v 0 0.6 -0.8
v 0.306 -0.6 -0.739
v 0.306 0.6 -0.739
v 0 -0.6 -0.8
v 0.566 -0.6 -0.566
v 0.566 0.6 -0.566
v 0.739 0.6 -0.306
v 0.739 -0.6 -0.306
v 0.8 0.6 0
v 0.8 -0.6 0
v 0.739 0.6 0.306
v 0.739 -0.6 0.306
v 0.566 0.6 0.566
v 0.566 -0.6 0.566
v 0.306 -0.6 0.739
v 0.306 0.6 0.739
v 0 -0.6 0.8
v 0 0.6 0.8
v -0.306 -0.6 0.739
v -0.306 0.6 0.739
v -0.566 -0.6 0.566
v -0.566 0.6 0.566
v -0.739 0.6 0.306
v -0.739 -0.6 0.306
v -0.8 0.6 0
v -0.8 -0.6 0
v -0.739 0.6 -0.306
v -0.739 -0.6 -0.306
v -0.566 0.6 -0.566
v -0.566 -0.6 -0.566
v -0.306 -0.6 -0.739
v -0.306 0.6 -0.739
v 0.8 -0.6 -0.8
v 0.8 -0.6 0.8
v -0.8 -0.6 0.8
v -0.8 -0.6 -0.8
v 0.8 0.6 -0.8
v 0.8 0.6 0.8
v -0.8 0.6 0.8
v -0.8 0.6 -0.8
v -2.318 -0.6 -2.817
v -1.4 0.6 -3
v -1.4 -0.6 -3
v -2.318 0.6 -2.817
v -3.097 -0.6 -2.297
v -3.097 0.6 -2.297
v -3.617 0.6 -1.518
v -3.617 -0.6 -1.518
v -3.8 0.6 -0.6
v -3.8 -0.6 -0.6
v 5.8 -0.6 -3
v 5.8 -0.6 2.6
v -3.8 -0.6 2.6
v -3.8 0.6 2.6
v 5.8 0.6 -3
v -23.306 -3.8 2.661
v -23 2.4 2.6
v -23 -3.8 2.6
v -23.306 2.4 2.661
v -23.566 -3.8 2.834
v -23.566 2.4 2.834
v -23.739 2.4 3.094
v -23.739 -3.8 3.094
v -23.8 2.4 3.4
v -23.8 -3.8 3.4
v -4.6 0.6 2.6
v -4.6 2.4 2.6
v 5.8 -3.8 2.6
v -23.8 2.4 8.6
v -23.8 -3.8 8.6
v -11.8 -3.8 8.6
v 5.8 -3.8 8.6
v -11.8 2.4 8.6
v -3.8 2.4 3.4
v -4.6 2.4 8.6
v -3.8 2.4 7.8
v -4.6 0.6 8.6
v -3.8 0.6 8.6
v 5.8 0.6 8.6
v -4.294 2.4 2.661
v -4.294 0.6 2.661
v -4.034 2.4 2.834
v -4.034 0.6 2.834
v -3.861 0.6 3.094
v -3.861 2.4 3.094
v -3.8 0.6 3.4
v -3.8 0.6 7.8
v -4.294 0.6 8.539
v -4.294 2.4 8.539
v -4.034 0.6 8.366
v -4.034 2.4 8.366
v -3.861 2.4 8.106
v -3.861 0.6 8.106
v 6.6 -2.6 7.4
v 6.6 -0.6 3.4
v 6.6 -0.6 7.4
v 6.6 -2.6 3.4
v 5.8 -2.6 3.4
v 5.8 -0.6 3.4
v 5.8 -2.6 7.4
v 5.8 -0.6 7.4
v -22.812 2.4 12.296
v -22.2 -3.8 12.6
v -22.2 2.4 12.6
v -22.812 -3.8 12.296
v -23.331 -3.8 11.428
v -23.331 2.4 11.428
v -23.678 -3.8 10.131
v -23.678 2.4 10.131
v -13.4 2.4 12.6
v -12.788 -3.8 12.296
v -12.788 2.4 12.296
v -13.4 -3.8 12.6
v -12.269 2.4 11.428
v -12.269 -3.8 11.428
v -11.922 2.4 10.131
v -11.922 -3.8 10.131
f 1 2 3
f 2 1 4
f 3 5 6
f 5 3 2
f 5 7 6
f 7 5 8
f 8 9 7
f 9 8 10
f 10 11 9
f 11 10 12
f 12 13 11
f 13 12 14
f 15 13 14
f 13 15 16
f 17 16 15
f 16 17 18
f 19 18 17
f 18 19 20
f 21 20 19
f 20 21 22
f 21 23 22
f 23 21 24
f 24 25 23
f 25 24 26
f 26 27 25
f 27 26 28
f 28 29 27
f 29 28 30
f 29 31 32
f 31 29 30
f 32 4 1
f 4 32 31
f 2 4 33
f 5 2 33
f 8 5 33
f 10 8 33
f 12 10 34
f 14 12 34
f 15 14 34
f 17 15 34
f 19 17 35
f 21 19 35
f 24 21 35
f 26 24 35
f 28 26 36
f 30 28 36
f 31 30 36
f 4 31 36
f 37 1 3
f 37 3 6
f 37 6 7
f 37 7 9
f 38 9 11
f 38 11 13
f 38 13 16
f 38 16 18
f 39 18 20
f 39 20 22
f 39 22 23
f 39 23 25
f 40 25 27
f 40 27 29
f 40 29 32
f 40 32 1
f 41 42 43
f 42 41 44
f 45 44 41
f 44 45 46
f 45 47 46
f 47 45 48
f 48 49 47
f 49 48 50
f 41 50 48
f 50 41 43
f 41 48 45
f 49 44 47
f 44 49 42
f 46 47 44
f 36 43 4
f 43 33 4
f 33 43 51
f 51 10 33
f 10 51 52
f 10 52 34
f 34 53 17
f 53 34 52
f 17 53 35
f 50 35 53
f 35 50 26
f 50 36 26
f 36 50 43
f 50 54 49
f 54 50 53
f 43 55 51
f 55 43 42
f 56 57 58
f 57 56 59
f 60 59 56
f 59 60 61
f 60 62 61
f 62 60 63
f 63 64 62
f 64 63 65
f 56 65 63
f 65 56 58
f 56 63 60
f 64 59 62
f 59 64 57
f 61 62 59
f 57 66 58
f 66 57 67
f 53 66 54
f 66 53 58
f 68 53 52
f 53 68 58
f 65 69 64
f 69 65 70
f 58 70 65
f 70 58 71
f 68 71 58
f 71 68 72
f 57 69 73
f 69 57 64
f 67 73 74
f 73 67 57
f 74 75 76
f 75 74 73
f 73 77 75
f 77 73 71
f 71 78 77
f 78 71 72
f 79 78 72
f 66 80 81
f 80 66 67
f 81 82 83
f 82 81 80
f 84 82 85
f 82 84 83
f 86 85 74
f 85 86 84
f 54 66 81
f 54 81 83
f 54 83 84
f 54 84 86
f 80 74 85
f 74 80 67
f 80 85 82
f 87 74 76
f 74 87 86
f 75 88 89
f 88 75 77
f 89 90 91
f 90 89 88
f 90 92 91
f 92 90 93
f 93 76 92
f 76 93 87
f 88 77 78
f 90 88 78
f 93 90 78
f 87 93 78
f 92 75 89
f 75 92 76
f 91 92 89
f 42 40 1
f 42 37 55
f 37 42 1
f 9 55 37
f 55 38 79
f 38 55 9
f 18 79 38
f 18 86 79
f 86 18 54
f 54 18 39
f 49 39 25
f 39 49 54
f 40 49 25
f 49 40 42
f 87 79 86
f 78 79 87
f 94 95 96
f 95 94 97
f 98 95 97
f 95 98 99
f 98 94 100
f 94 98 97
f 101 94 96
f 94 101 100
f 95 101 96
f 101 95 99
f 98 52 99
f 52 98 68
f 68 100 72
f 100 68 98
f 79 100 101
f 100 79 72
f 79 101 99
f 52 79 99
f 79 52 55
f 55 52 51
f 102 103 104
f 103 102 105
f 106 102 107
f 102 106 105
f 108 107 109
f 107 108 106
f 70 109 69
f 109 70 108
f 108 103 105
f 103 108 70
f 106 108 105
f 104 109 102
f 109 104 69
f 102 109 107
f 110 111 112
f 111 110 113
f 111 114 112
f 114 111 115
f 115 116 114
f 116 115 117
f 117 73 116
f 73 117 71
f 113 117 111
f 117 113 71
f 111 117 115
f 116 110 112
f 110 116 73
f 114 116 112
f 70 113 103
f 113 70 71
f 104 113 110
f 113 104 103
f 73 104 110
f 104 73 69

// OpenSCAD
// file: ../p/4-4edge.scad
use <../lib.scad>
function ldraw_lib__4_4edge() = [
// 0 Circle 1.0
// 0 Name: 4-4edge.dat
// 0 Author: James Jessiman
// 0 !LDRAW_ORG Primitive UPDATE 2017-01
// 0 !LICENSE Licensed under CC BY 4.0 : see CAreadme.txt
// 
// 0 BFC CERTIFY CCW
  [0,"BFC","CERTIFY"],
  [0,"BFC","CCW"],
// 
// 0 !HISTORY 1998-12-15 [PTadmin] Official Update 1998-10
// 0 !HISTORY 2005-12-28 [PTadmin] Official Update 2005-01
// 0 !HISTORY 2007-06-24 [PTadmin] Header formatted for Contributor Agreement
// 0 !HISTORY 2008-07-01 [PTadmin] Official Update 2008-01
// 0 !HISTORY 2017-01-15 [Steffen] BFCed
// 0 !HISTORY 2017-12-30 [PTadmin] Official Update 2017-01
// 
// 
// 2 24 1 0 0 0.9239 0 0.3827
  [2,24,1,0,0,0.9239,0,0.3827],
// 2 24 0.9239 0 0.3827 0.7071 0 0.7071
  [2,24,0.9239,0,0.3827,0.7071,0,0.7071],
// 2 24 0.7071 0 0.7071 0.3827 0 0.9239
  [2,24,0.7071,0,0.7071,0.3827,0,0.9239],
// 2 24 0.3827 0 0.9239 0 0 1
  [2,24,0.3827,0,0.9239,0,0,1],
// 2 24 0 0 1 -0.3827 0 0.9239
  [2,24,0,0,1,-0.3827,0,0.9239],
// 2 24 -0.3827 0 0.9239 -0.7071 0 0.7071
  [2,24,-0.3827,0,0.9239,-0.7071,0,0.7071],
// 2 24 -0.7071 0 0.7071 -0.9239 0 0.3827
  [2,24,-0.7071,0,0.7071,-0.9239,0,0.3827],
// 2 24 -0.9239 0 0.3827 -1 0 -0
  [2,24,-0.9239,0,0.3827,-1,0,-0],
// 2 24 -1 0 -0 -0.9239 0 -0.3827
  [2,24,-1,0,-0,-0.9239,0,-0.3827],
// 2 24 -0.9239 0 -0.3827 -0.7071 0 -0.7071
  [2,24,-0.9239,0,-0.3827,-0.7071,0,-0.7071],
// 2 24 -0.7071 0 -0.7071 -0.3827 0 -0.9239
  [2,24,-0.7071,0,-0.7071,-0.3827,0,-0.9239],
// 2 24 -0.3827 0 -0.9239 0 0 -1
  [2,24,-0.3827,0,-0.9239,0,0,-1],
// 2 24 0 0 -1 0.3827 0 -0.9239
  [2,24,0,0,-1,0.3827,0,-0.9239],
// 2 24 0.3827 0 -0.9239 0.7071 0 -0.7071
  [2,24,0.3827,0,-0.9239,0.7071,0,-0.7071],
// 2 24 0.7071 0 -0.7071 0.9239 0 -0.3827
  [2,24,0.7071,0,-0.7071,0.9239,0,-0.3827],
// 2 24 0.9239 0 -0.3827 1 0 0
  [2,24,0.9239,0,-0.3827,1,0,0],
];
module ldraw_lib__4_4edge(step=0, col=false, unit=2/5, alt=false, line=0.2, solid=!$preview)
    makepoly(ldraw_lib__4_4edge(), step=step, col=col, unit=unit, alt=alt, line=line, solid=solid);
ldraw_lib__4_4edge(line=0.2);
// file: ../p/4-4cyli.scad
use <../lib.scad>
function ldraw_lib__4_4cyli() = [
// 0 Cylinder 1.0
// 0 Name: 4-4cyli.dat
// 0 Author: James Jessiman
// 0 !LDRAW_ORG Primitive UPDATE 2005-01
// 0 !LICENSE Licensed under CC BY 4.0 : see CAreadme.txt
// 
// 0 BFC CERTIFY CCW
  [0,"BFC","CERTIFY"],
  [0,"BFC","CCW"],
// 
// 0 !HISTORY 1998-12-15 [PTadmin] Official Update 1998-10
// 0 !HISTORY 2002-03-23 [sbliss] Added BFC statement; merged headers from files in distributions LDraw 0.27 and Complete.
// 0 !HISTORY 2002-04-25 [PTadmin] Official Update 2002-02
// 0 !HISTORY 2004-12-14 [guyvivan] BFC CCW
// 0 !HISTORY 2005-12-28 [PTadmin] Official Update 2005-01
// 0 !HISTORY 2007-06-24 [PTadmin] Header formatted for Contributor Agreement
// 0 !HISTORY 2008-07-01 [PTadmin] Official Update 2008-01
// 
// 
// 4 16 1 1 0 0.9239 1 0.3827 0.9239 0 0.3827 1 0 0
  [4,16,1,1,0,0.9239,1,0.3827,0.9239,0,0.3827,1,0,0],
// 5 24 1 0 0 1 1 0 0.9239 0 0.3827 0.9239 0 -0.3827
  [5,24,1,0,0,1,1,0,0.9239,0,0.3827,0.9239,0,-0.3827],
// 4 16 0.9239 1 0.3827 0.7071 1 0.7071 0.7071 0 0.7071 0.9239 0 0.3827
  [4,16,0.9239,1,0.3827,0.7071,1,0.7071,0.7071,0,0.7071,0.9239,0,0.3827],
// 5 24 0.9239 0 0.3827 0.9239 1 0.3827 0.7071 0 0.7071 1 0 0
  [5,24,0.9239,0,0.3827,0.9239,1,0.3827,0.7071,0,0.7071,1,0,0],
// 4 16 0.7071 1 0.7071 0.3827 1 0.9239 0.3827 0 0.9239 0.7071 0 0.7071
  [4,16,0.7071,1,0.7071,0.3827,1,0.9239,0.3827,0,0.9239,0.7071,0,0.7071],
// 5 24 0.7071 0 0.7071 0.7071 1 0.7071 0.3827 0 0.9239 0.9239 0 0.3827
  [5,24,0.7071,0,0.7071,0.7071,1,0.7071,0.3827,0,0.9239,0.9239,0,0.3827],
// 4 16 0.3827 1 0.9239 0 1 1 0 0 1 0.3827 0 0.9239
  [4,16,0.3827,1,0.9239,0,1,1,0,0,1,0.3827,0,0.9239],
// 5 24 0.3827 0 0.9239 0.3827 1 0.9239 0 0 1 0.7071 0 0.7071
  [5,24,0.3827,0,0.9239,0.3827,1,0.9239,0,0,1,0.7071,0,0.7071],
// 4 16 0 1 1 -0.3827 1 0.9239 -0.3827 0 0.9239 0 0 1
  [4,16,0,1,1,-0.3827,1,0.9239,-0.3827,0,0.9239,0,0,1],
// 5 24 0 0 1 0 1 1 -0.3827 0 0.9239 0.3827 0 0.9239
  [5,24,0,0,1,0,1,1,-0.3827,0,0.9239,0.3827,0,0.9239],
// 4 16 -0.3827 1 0.9239 -0.7071 1 0.7071 -0.7071 0 0.7071 -0.3827 0 0.9239
  [4,16,-0.3827,1,0.9239,-0.7071,1,0.7071,-0.7071,0,0.7071,-0.3827,0,0.9239],
// 5 24 -0.3827 0 0.9239 -0.3827 1 0.9239 -0.7071 0 0.7071 0 0 1
  [5,24,-0.3827,0,0.9239,-0.3827,1,0.9239,-0.7071,0,0.7071,0,0,1],
// 4 16 -0.7071 1 0.7071 -0.9239 1 0.3827 -0.9239 0 0.3827 -0.7071 0 0.7071
  [4,16,-0.7071,1,0.7071,-0.9239,1,0.3827,-0.9239,0,0.3827,-0.7071,0,0.7071],
// 5 24 -0.7071 0 0.7071 -0.7071 1 0.7071 -0.9239 0 0.3827 -0.3827 0 0.9239
  [5,24,-0.7071,0,0.7071,-0.7071,1,0.7071,-0.9239,0,0.3827,-0.3827,0,0.9239],
// 4 16 -0.9239 1 0.3827 -1 1 0 -1 0 0 -0.9239 0 0.3827
  [4,16,-0.9239,1,0.3827,-1,1,0,-1,0,0,-0.9239,0,0.3827],
// 5 24 -0.9239 0 0.3827 -0.9239 1 0.3827 -1 0 0 -0.7071 0 0.7071
  [5,24,-0.9239,0,0.3827,-0.9239,1,0.3827,-1,0,0,-0.7071,0,0.7071],
// 4 16 -1 1 0 -0.9239 1 -0.3827 -0.9239 0 -0.3827 -1 0 0
  [4,16,-1,1,0,-0.9239,1,-0.3827,-0.9239,0,-0.3827,-1,0,0],
// 5 24 -1 0 0 -1 1 0 -0.9239 0 -0.3827 -0.9239 0 0.3827
  [5,24,-1,0,0,-1,1,0,-0.9239,0,-0.3827,-0.9239,0,0.3827],
// 4 16 -0.9239 1 -0.3827 -0.7071 1 -0.7071 -0.7071 0 -0.7071 -0.9239 0 -0.3827
  [4,16,-0.9239,1,-0.3827,-0.7071,1,-0.7071,-0.7071,0,-0.7071,-0.9239,0,-0.3827],
// 5 24 -0.9239 0 -0.3827 -0.9239 1 -0.3827 -0.7071 0 -0.7071 -1 0 0
  [5,24,-0.9239,0,-0.3827,-0.9239,1,-0.3827,-0.7071,0,-0.7071,-1,0,0],
// 4 16 -0.7071 1 -0.7071 -0.3827 1 -0.9239 -0.3827 0 -0.9239 -0.7071 0 -0.7071
  [4,16,-0.7071,1,-0.7071,-0.3827,1,-0.9239,-0.3827,0,-0.9239,-0.7071,0,-0.7071],
// 5 24 -0.7071 0 -0.7071 -0.7071 1 -0.7071 -0.3827 0 -0.9239 -0.9239 0 -0.3827
  [5,24,-0.7071,0,-0.7071,-0.7071,1,-0.7071,-0.3827,0,-0.9239,-0.9239,0,-0.3827],
// 4 16 -0.3827 1 -0.9239 0 1 -1 0 0 -1 -0.3827 0 -0.9239
  [4,16,-0.3827,1,-0.9239,0,1,-1,0,0,-1,-0.3827,0,-0.9239],
// 5 24 -0.3827 0 -0.9239 -0.3827 1 -0.9239 0 0 -1 -0.7071 0 -0.7071
  [5,24,-0.3827,0,-0.9239,-0.3827,1,-0.9239,0,0,-1,-0.7071,0,-0.7071],
// 4 16 0 1 -1 0.3827 1 -0.9239 0.3827 0 -0.9239 0 0 -1
  [4,16,0,1,-1,0.3827,1,-0.9239,0.3827,0,-0.9239,0,0,-1],
// 5 24 0 0 -1 0 1 -1 0.3827 0 -0.9239 -0.3827 0 -0.9239
  [5,24,0,0,-1,0,1,-1,0.3827,0,-0.9239,-0.3827,0,-0.9239],
// 4 16 0.3827 1 -0.9239 0.7071 1 -0.7071 0.7071 0 -0.7071 0.3827 0 -0.9239
  [4,16,0.3827,1,-0.9239,0.7071,1,-0.7071,0.7071,0,-0.7071,0.3827,0,-0.9239],
// 5 24 0.3827 0 -0.9239 0.3827 1 -0.9239 0.7071 0 -0.7071 0 0 -1
  [5,24,0.3827,0,-0.9239,0.3827,1,-0.9239,0.7071,0,-0.7071,0,0,-1],
// 4 16 0.7071 1 -0.7071 0.9239 1 -0.3827 0.9239 0 -0.3827 0.7071 0 -0.7071
  [4,16,0.7071,1,-0.7071,0.9239,1,-0.3827,0.9239,0,-0.3827,0.7071,0,-0.7071],
// 5 24 0.7071 0 -0.7071 0.7071 1 -0.7071 0.9239 0 -0.3827 0.3827 0 -0.9239
  [5,24,0.7071,0,-0.7071,0.7071,1,-0.7071,0.9239,0,-0.3827,0.3827,0,-0.9239],
// 4 16 0.9239 1 -0.3827 1 1 0 1 0 0 0.9239 0 -0.3827
  [4,16,0.9239,1,-0.3827,1,1,0,1,0,0,0.9239,0,-0.3827],
// 5 24 0.9239 0 -0.3827 0.9239 1 -0.3827 1 0 0 0.7071 0 -0.7071
  [5,24,0.9239,0,-0.3827,0.9239,1,-0.3827,1,0,0,0.7071,0,-0.7071],
// 0
];
module ldraw_lib__4_4cyli(step=0, col=false, unit=2/5, alt=false, line=0.2, solid=!$preview)
    makepoly(ldraw_lib__4_4cyli(), step=step, col=col, unit=unit, alt=alt, line=line, solid=solid);
ldraw_lib__4_4cyli(line=0.2);
// file: ../p/1-4edge.scad
use <../lib.scad>
function ldraw_lib__1_4edge() = [
// 0 Circle 0.25
// 0 Name: 1-4edge.dat
// 0 Author: James Jessiman
// 0 !LDRAW_ORG Primitive UPDATE 2017-01
// 0 !LICENSE Licensed under CC BY 4.0 : see CAreadme.txt
// 
// 0 BFC CERTIFY CCW
  [0,"BFC","CERTIFY"],
  [0,"BFC","CCW"],
// 
// 0 !HISTORY 2007-06-22 [PTadmin] Header formatted for Contributor Agreement
// 0 !HISTORY 2008-07-01 [PTadmin] Official Update 2008-01
// 0 !HISTORY 2017-01-15 [Steffen] BFCed
// 0 !HISTORY 2017-12-30 [PTadmin] Official Update 2017-01
// 
// 
// 2 24 1 0 0 0.9239 0 0.3827
  [2,24,1,0,0,0.9239,0,0.3827],
// 2 24 0.9239 0 0.3827 0.7071 0 0.7071
  [2,24,0.9239,0,0.3827,0.7071,0,0.7071],
// 2 24 0.7071 0 0.7071 0.3827 0 0.9239
  [2,24,0.7071,0,0.7071,0.3827,0,0.9239],
// 2 24 0.3827 0 0.9239 0 0 1
  [2,24,0.3827,0,0.9239,0,0,1],
];
module ldraw_lib__1_4edge(step=0, col=false, unit=2/5, alt=false, line=0.2, solid=!$preview)
    makepoly(ldraw_lib__1_4edge(), step=step, col=col, unit=unit, alt=alt, line=line, solid=solid);
ldraw_lib__1_4edge(line=0.2);
// file: ../p/1-4cyli.scad
use <../lib.scad>
function ldraw_lib__1_4cyli() = [
// 0 Cylinder 0.25
// 0 Name: 1-4cyli.dat
// 0 Author: James Jessiman
// 0 !LDRAW_ORG Primitive UPDATE 2012-01
// 0 !LICENSE Licensed under CC BY 4.0 : see CAreadme.txt
// 
// 0 BFC CERTIFY CCW
  [0,"BFC","CERTIFY"],
  [0,"BFC","CCW"],
// 
// 0 !HISTORY 2002-03-23 [sbliss] Added BFC statement.
// 0 !HISTORY 2002-04-25 [PTadmin] Official Update 2002-02
// 0 !HISTORY 2007-06-22 [PTadmin] Header formatted for Contributor Agreement
// 0 !HISTORY 2008-07-01 [PTadmin] Official Update 2008-01
// 0 !HISTORY 2012-02-16 [Philo] Changed to CCW
// 0 !HISTORY 2012-03-30 [PTadmin] Official Update 2012-01
// 
// 
// 4 16 1 1 0 0.9239 1 0.3827 0.9239 0 0.3827 1 0 0
  [4,16,1,1,0,0.9239,1,0.3827,0.9239,0,0.3827,1,0,0],
// 5 24 1 0 0 1 1 0 0.9239 0 0.3827 1 0 -1
  [5,24,1,0,0,1,1,0,0.9239,0,0.3827,1,0,-1],
// 4 16 0.9239 1 0.3827 0.7071 1 0.7071 0.7071 0 0.7071 0.9239 0 0.3827
  [4,16,0.9239,1,0.3827,0.7071,1,0.7071,0.7071,0,0.7071,0.9239,0,0.3827],
// 5 24 0.9239 0 0.3827 0.9239 1 0.3827 0.7071 0 0.7071 1 0 0
  [5,24,0.9239,0,0.3827,0.9239,1,0.3827,0.7071,0,0.7071,1,0,0],
// 4 16 0.7071 1 0.7071 0.3827 1 0.9239 0.3827 0 0.9239 0.7071 0 0.7071
  [4,16,0.7071,1,0.7071,0.3827,1,0.9239,0.3827,0,0.9239,0.7071,0,0.7071],
// 5 24 0.7071 0 0.7071 0.7071 1 0.7071 0.3827 0 0.9239 0.9239 0 0.3827
  [5,24,0.7071,0,0.7071,0.7071,1,0.7071,0.3827,0,0.9239,0.9239,0,0.3827],
// 4 16 0.3827 1 0.9239 0 1 1 0 0 1 0.3827 0 0.9239
  [4,16,0.3827,1,0.9239,0,1,1,0,0,1,0.3827,0,0.9239],
// 5 24 0.3827 0 0.9239 0.3827 1 0.9239 0 0 1 0.7071 0 0.7071
  [5,24,0.3827,0,0.9239,0.3827,1,0.9239,0,0,1,0.7071,0,0.7071],
// 5 24 0 0 1 0 1 1 0.3827 0 0.9239 -1 0 1
  [5,24,0,0,1,0,1,1,0.3827,0,0.9239,-1,0,1],
];
module ldraw_lib__1_4cyli(step=0, col=false, unit=2/5, alt=false, line=0.2, solid=!$preview)
    makepoly(ldraw_lib__1_4cyli(), step=step, col=col, unit=unit, alt=alt, line=line, solid=solid);
ldraw_lib__1_4cyli(line=0.2);
// file: ../p/rect3.scad
use <../lib.scad>
function ldraw_lib__rect3() = [
// 0 Rectangle with 3 Edges
// 0 Name: rect3.dat
// 0 Author: Mark Kennedy [mkennedy]
// 0 !LDRAW_ORG Primitive UPDATE 2010-01
// 0 !LICENSE Licensed under CC BY 4.0 : see CAreadme.txt
// 
// 0 BFC CERTIFY CCW
  [0,"BFC","CERTIFY"],
  [0,"BFC","CCW"],
// 
// 0 !HISTORY 2003-08-01 [PTadmin] Official Update 2003-02
// 0 !HISTORY 2007-06-24 [PTadmin] Header formatted for Contributor Agreement
// 0 !HISTORY 2008-07-01 [PTadmin] Official Update 2008-01
// 0 !HISTORY 2010-01-17 [mikeheide] Change winding to CCW
// 0 !HISTORY 2010-04-05 [PTadmin] Official Update 2010-01
// 
// 
// 2 24 1 0 1 -1 0 1
  [2,24,1,0,1,-1,0,1],
// 2 24 1 0 1 1 0 -1
  [2,24,1,0,1,1,0,-1],
// 2 24 -1 0 1 -1 0 -1
  [2,24,-1,0,1,-1,0,-1],
// 4 16 -1 0 1 -1 0 -1 1 0 -1 1 0 1
  [4,16,-1,0,1,-1,0,-1,1,0,-1,1,0,1],
// 0 //
];
module ldraw_lib__rect3(step=0, col=false, unit=2/5, alt=false, line=0.2, solid=!$preview)
    makepoly(ldraw_lib__rect3(), step=step, col=col, unit=unit, alt=alt, line=line, solid=solid);
ldraw_lib__rect3(line=0.2);
// file: ../p/rect2p.scad
use <../lib.scad>
function ldraw_lib__rect2p() = [
// 0 Rectangle with 2 Parallel Edges
// 0 Name: rect2p.dat
// 0 Author: Donald Sutter [technog]
// 0 !LDRAW_ORG Primitive UPDATE 2010-01
// 0 !LICENSE Licensed under CC BY 4.0 : see CAreadme.txt
// 
// 0 BFC CERTIFY CCW
  [0,"BFC","CERTIFY"],
  [0,"BFC","CCW"],
// 
// 0 !HISTORY 2003-08-01 [PTadmin] Official Update 2003-02
// 0 !HISTORY 2007-06-24 [PTadmin] Header formatted for Contributor Agreement
// 0 !HISTORY 2008-07-01 [PTadmin] Official Update 2008-01
// 0 !HISTORY 2010-01-17 [mikeheide] changed winding to CCW
// 0 !HISTORY 2010-04-05 [PTadmin] Official Update 2010-01
// 
// 
// 2 24 1 0 1 -1 0 1
  [2,24,1,0,1,-1,0,1],
// 2 24 -1 0 -1 1 0 -1
  [2,24,-1,0,-1,1,0,-1],
// 4 16 -1 0 1 -1 0 -1 1 0 -1 1 0 1
  [4,16,-1,0,1,-1,0,-1,1,0,-1,1,0,1],
// 0
];
module ldraw_lib__rect2p(step=0, col=false, unit=2/5, alt=false, line=0.2, solid=!$preview)
    makepoly(ldraw_lib__rect2p(), step=step, col=col, unit=unit, alt=alt, line=line, solid=solid);
ldraw_lib__rect2p(line=0.2);
// file: ../p/box5.scad
use <../lib.scad>
function ldraw_lib__box5() = [
// 0 Box with 5 Faces and All Edges
// 0 Name: box5.dat
// 0 Author: James Jessiman
// 0 !LDRAW_ORG Primitive UPDATE 2012-01
// 0 !LICENSE Licensed under CC BY 4.0 : see CAreadme.txt
// 
// 0 BFC CERTIFY CCW
  [0,"BFC","CERTIFY"],
  [0,"BFC","CCW"],
// 
// 0 !HISTORY 2002-04-03 [sbliss] Modified for BFC compliance
// 0 !HISTORY 2002-04-25 [PTadmin] Official Update 2002-02
// 0 !HISTORY 2007-06-24 [PTadmin] Header formatted for Contributor Agreement
// 0 !HISTORY 2008-07-01 [PTadmin] Official Update 2008-01
// 0 !HISTORY 2012-02-16 [Philo] Changed to CCW
// 0 !HISTORY 2012-03-30 [PTadmin] Official Update 2012-01
// 
// 
// 2 24 1 1 1 -1 1 1
  [2,24,1,1,1,-1,1,1],
// 2 24 -1 1 1 -1 1 -1
  [2,24,-1,1,1,-1,1,-1],
// 2 24 -1 1 -1 1 1 -1
  [2,24,-1,1,-1,1,1,-1],
// 2 24 1 1 -1 1 1 1
  [2,24,1,1,-1,1,1,1],
// 2 24 1 0 1 -1 0 1
  [2,24,1,0,1,-1,0,1],
// 2 24 -1 0 1 -1 0 -1
  [2,24,-1,0,1,-1,0,-1],
// 2 24 -1 0 -1 1 0 -1
  [2,24,-1,0,-1,1,0,-1],
// 2 24 1 0 -1 1 0 1
  [2,24,1,0,-1,1,0,1],
// 2 24 1 0 1 1 1 1
  [2,24,1,0,1,1,1,1],
// 2 24 -1 0 1 -1 1 1
  [2,24,-1,0,1,-1,1,1],
// 2 24 1 0 -1 1 1 -1
  [2,24,1,0,-1,1,1,-1],
// 2 24 -1 0 -1 -1 1 -1
  [2,24,-1,0,-1,-1,1,-1],
// 4 16 -1 1 1 1 1 1 1 1 -1 -1 1 -1
  [4,16,-1,1,1,1,1,1,1,1,-1,-1,1,-1],
// 4 16 -1 1 1 -1 0 1 1 0 1 1 1 1
  [4,16,-1,1,1,-1,0,1,1,0,1,1,1,1],
// 4 16 -1 1 -1 -1 0 -1 -1 0 1 -1 1 1
  [4,16,-1,1,-1,-1,0,-1,-1,0,1,-1,1,1],
// 4 16 1 1 -1 1 0 -1 -1 0 -1 -1 1 -1
  [4,16,1,1,-1,1,0,-1,-1,0,-1,-1,1,-1],
// 4 16 1 1 1 1 0 1 1 0 -1 1 1 -1
  [4,16,1,1,1,1,0,1,1,0,-1,1,1,-1],
];
module ldraw_lib__box5(step=0, col=false, unit=2/5, alt=false, line=0.2, solid=!$preview)
    makepoly(ldraw_lib__box5(), step=step, col=col, unit=unit, alt=alt, line=line, solid=solid);
ldraw_lib__box5(line=0.2);
// file: ../p/4-4ndis.scad
use <../lib.scad>
function ldraw_lib__4_4ndis() = [
// 0 Disc Negative 1.0
// 0 Name: 4-4ndis.dat
// 0 Author: James Jessiman
// 0 !LDRAW_ORG Primitive UPDATE 2012-01
// 0 !LICENSE Licensed under CC BY 4.0 : see CAreadme.txt
// 
// 0 BFC CERTIFY CCW
  [0,"BFC","CERTIFY"],
  [0,"BFC","CCW"],
// 
// 0 !HISTORY 2002-03-23 [sbliss] Added BFC statement; compacted code
// 0 !HISTORY 2002-04-25 [PTadmin] Official Update 2002-02
// 0 !HISTORY 2007-06-24 [PTadmin] Header formatted for Contributor Agreement
// 0 !HISTORY 2008-07-01 [PTadmin] Official Update 2008-01
// 0 !HISTORY 2012-02-16 [Philo] Changed to CCW
// 0 !HISTORY 2012-03-30 [PTadmin] Official Update 2012-01
// 
// 
// 3 16 0.9239 0 0.3827 1 0 0 1 0 1
  [3,16,0.9239,0,0.3827,1,0,0,1,0,1],
// 3 16 0.7071 0 0.7071 0.9239 0 0.3827 1 0 1
  [3,16,0.7071,0,0.7071,0.9239,0,0.3827,1,0,1],
// 3 16 0.3827 0 0.9239 0.7071 0 0.7071 1 0 1
  [3,16,0.3827,0,0.9239,0.7071,0,0.7071,1,0,1],
// 3 16 0 0 1 0.3827 0 0.9239 1 0 1
  [3,16,0,0,1,0.3827,0,0.9239,1,0,1],
// 3 16 -0.3827 0 0.9239 0 0 1 -1 0 1
  [3,16,-0.3827,0,0.9239,0,0,1,-1,0,1],
// 3 16 -0.7071 0 0.7071 -0.3827 0 0.9239 -1 0 1
  [3,16,-0.7071,0,0.7071,-0.3827,0,0.9239,-1,0,1],
// 3 16 -0.9239 0 0.3827 -0.7071 0 0.7071 -1 0 1
  [3,16,-0.9239,0,0.3827,-0.7071,0,0.7071,-1,0,1],
// 3 16 -1 0 0 -0.9239 0 0.3827 -1 0 1
  [3,16,-1,0,0,-0.9239,0,0.3827,-1,0,1],
// 3 16 -0.9239 0 -0.3827 -1 0 0 -1 0 -1
  [3,16,-0.9239,0,-0.3827,-1,0,0,-1,0,-1],
// 3 16 -0.7071 0 -0.7071 -0.9239 0 -0.3827 -1 0 -1
  [3,16,-0.7071,0,-0.7071,-0.9239,0,-0.3827,-1,0,-1],
// 3 16 -0.3827 0 -0.9239 -0.7071 0 -0.7071 -1 0 -1
  [3,16,-0.3827,0,-0.9239,-0.7071,0,-0.7071,-1,0,-1],
// 3 16 0 0 -1 -0.3827 0 -0.9239 -1 0 -1
  [3,16,0,0,-1,-0.3827,0,-0.9239,-1,0,-1],
// 3 16 0.3827 0 -0.9239 0 0 -1 1 0 -1
  [3,16,0.3827,0,-0.9239,0,0,-1,1,0,-1],
// 3 16 0.7071 0 -0.7071 0.3827 0 -0.9239 1 0 -1
  [3,16,0.7071,0,-0.7071,0.3827,0,-0.9239,1,0,-1],
// 3 16 0.9239 0 -0.3827 0.7071 0 -0.7071 1 0 -1
  [3,16,0.9239,0,-0.3827,0.7071,0,-0.7071,1,0,-1],
// 3 16 1 0 0 0.9239 0 -0.3827 1 0 -1
  [3,16,1,0,0,0.9239,0,-0.3827,1,0,-1],
];
module ldraw_lib__4_4ndis(step=0, col=false, unit=2/5, alt=false, line=0.2, solid=!$preview)
    makepoly(ldraw_lib__4_4ndis(), step=step, col=col, unit=unit, alt=alt, line=line, solid=solid);
ldraw_lib__4_4ndis(line=0.2);
// file: ../p/4-4cylo.scad
use <../lib.scad>
use <4-4cyli.scad>
use <4-4edge.scad>
function ldraw_lib__4_4cylo() = [
// 0 Cylinder Open 1.0
// 0 Name: 4-4cylo.dat
// 0 Author: Mark Kennedy [mkennedy]
// 0 !LDRAW_ORG Primitive UPDATE 2010-01
// 0 !LICENSE Licensed under CC BY 4.0 : see CAreadme.txt
// 
// 0 BFC CERTIFY CCW
  [0,"BFC","CERTIFY"],
  [0,"BFC","CCW"],
// 
// 0 !HISTORY 2010-04-05 [PTadmin] Official Update 2010-01
// 
// 
// 1 16 0 0 0 1 0 0 0 1 0 0 0 1 4-4edge.dat
  [1,16,0,0,0,1,0,0,0,1,0,0,0,1, ldraw_lib__4_4edge()],
// 1 16 0 1 0 1 0 0 0 1 0 0 0 1 4-4edge.dat
  [1,16,0,1,0,1,0,0,0,1,0,0,0,1, ldraw_lib__4_4edge()],
// 1 16 0 0 0 1 0 0 0 1 0 0 0 1 4-4cyli.dat
  [1,16,0,0,0,1,0,0,0,1,0,0,0,1, ldraw_lib__4_4cyli()],
// 0
];
module ldraw_lib__4_4cylo(step=0, col=false, unit=2/5, alt=false, line=0.2, solid=!$preview)
    makepoly(ldraw_lib__4_4cylo(), step=step, col=col, unit=unit, alt=alt, line=line, solid=solid);
ldraw_lib__4_4cylo(line=0.2);
// file: ../p/1-4ndis.scad
use <../lib.scad>
function ldraw_lib__1_4ndis() = [
// 0 Disc Negative 0.25
// 0 Name: 1-4ndis.dat
// 0 Author: James Jessiman
// 0 !LDRAW_ORG Primitive UPDATE 2012-01
// 0 !LICENSE Licensed under CC BY 4.0 : see CAreadme.txt
// 
// 0 BFC CERTIFY CCW
  [0,"BFC","CERTIFY"],
  [0,"BFC","CCW"],
// 
// 0 !HISTORY 2002-03-23 [sbliss] Added BFC Statement
// 0 !HISTORY 2002-04-25 [PTadmin] Official Update 2002-02
// 0 !HISTORY 2007-06-22 [PTadmin] Header formatted for Contributor Agreement
// 0 !HISTORY 2008-07-01 [PTadmin] Official Update 2008-01
// 0 !HISTORY 2012-02-16 [Philo] Changed to CCW
// 0 !HISTORY 2012-03-30 [PTadmin] Official Update 2012-01
// 
// 
// 3 16 0.9239 0 0.3827 1 0 0 1 0 1
  [3,16,0.9239,0,0.3827,1,0,0,1,0,1],
// 3 16 0.7071 0 0.7071 0.9239 0 0.3827 1 0 1
  [3,16,0.7071,0,0.7071,0.9239,0,0.3827,1,0,1],
// 3 16 0.3827 0 0.9239 0.7071 0 0.7071 1 0 1
  [3,16,0.3827,0,0.9239,0.7071,0,0.7071,1,0,1],
// 3 16 0 0 1 0.3827 0 0.9239 1 0 1
  [3,16,0,0,1,0.3827,0,0.9239,1,0,1],
];
module ldraw_lib__1_4ndis(step=0, col=false, unit=2/5, alt=false, line=0.2, solid=!$preview)
    makepoly(ldraw_lib__1_4ndis(), step=step, col=col, unit=unit, alt=alt, line=line, solid=solid);
ldraw_lib__1_4ndis(line=0.2);
// file: ../p/1-4cylo.scad
use <../lib.scad>
use <1-4cyli.scad>
use <1-4edge.scad>
function ldraw_lib__1_4cylo() = [
// 0 Cylinder Open 0.25
// 0 Name: 1-4cylo.dat
// 0 Author: Max Martin Richter [MMR1988]
// 0 !LDRAW_ORG Primitive UPDATE 2010-03
// 0 !LICENSE Licensed under CC BY 4.0 : see CAreadme.txt
// 
// 0 BFC CERTIFY CCW
  [0,"BFC","CERTIFY"],
  [0,"BFC","CCW"],
// 
// 0 !HISTORY 2010-12-31 [PTadmin] Official Update 2010-03
// 
// 
// 1 16 0 0 0 1 0 0 0 1 0 0 0 1 1-4edge.dat
  [1,16,0,0,0,1,0,0,0,1,0,0,0,1, ldraw_lib__1_4edge()],
// 1 16 0 1 0 1 0 0 0 1 0 0 0 1 1-4edge.dat
  [1,16,0,1,0,1,0,0,0,1,0,0,0,1, ldraw_lib__1_4edge()],
// 1 16 0 0 0 1 0 0 0 1 0 0 0 1 1-4cyli.dat
  [1,16,0,0,0,1,0,0,0,1,0,0,0,1, ldraw_lib__1_4cyli()],
];
module ldraw_lib__1_4cylo(step=0, col=false, unit=2/5, alt=false, line=0.2, solid=!$preview)
    makepoly(ldraw_lib__1_4cylo(), step=step, col=col, unit=unit, alt=alt, line=line, solid=solid);
ldraw_lib__1_4cylo(line=0.2);
// file: ../p/1-4chrd.scad
use <../lib.scad>
function ldraw_lib__1_4chrd() = [
// 0 Chord 0.25
// 0 Name: 1-4chrd.dat
// 0 Author: Max Martin Richter [MMR1988]
// 0 !LDRAW_ORG Primitive UPDATE 2023-05
// 0 !LICENSE Licensed under CC BY 4.0 : see CAreadme.txt
// 
// 0 BFC CERTIFY CCW
  [0,"BFC","CERTIFY"],
  [0,"BFC","CCW"],
// 
// 0 !HISTORY 2004-04-22 [PTadmin] Official Update 2004-02
// 0 !HISTORY 2007-10-09 [PTadmin] Header formatted for Contributor Agreement
// 0 !HISTORY 2008-07-01 [PTadmin] Official Update 2008-01
// 0 !HISTORY 2012-08-02 [MMR1988] Re-creation with PrimGen2 and Rectifier
// 0 !HISTORY 2012-08-09 [PTadmin] Official Update 2012-02
// 0 !HISTORY 2023-10-27 [OrionP] Change author to MMR1988 from hafhead
// 0 !HISTORY 2023-10-31 [OrionP] Official Update 2023-05
// 
// 4 16 0.9239 0 0.3827 0.3827 0 0.9239 0 0 1 1 0 0
  [4,16,0.9239,0,0.3827,0.3827,0,0.9239,0,0,1,1,0,0],
// 3 16 0.7071 0 0.7071 0.3827 0 0.9239 0.9239 0 0.3827
  [3,16,0.7071,0,0.7071,0.3827,0,0.9239,0.9239,0,0.3827],
];
module ldraw_lib__1_4chrd(step=0, col=false, unit=2/5, alt=false, line=0.2, solid=!$preview)
    makepoly(ldraw_lib__1_4chrd(), step=step, col=col, unit=unit, alt=alt, line=line, solid=solid);
ldraw_lib__1_4chrd(line=0.2);
// main file
use <../lib.scad>
use <../p/1-4chrd.scad>
use <../p/1-4cylo.scad>
use <../p/1-4ndis.scad>
use <../p/4-4cylo.scad>
use <../p/4-4ndis.scad>
use <../p/box5.scad>
use <../p/rect2p.scad>
use <../p/rect3.scad>
function ldraw_lib__u9187f() = [
// 0 ~Garage Door Counterweight with Pin Hole Right
// 0 Name: u9187f.dat
// 0 Author: N. W. Perry [Plastikean]
// 0 !LDRAW_ORG Part UPDATE 2023-07
// 0 !LICENSE Licensed under CC BY 4.0 : see CAreadme.txt
// 
// 0 BFC CERTIFY CCW
  [0,"BFC","CERTIFY"],
  [0,"BFC","CCW"],
// 
// 0 !KEYWORDS Lego Mursten
// 
// 0 !HISTORY 2023-12-31 [OrionP] Official Update 2023-07
// 
// 0 BFC INVERTNEXT
  [0,"BFC","INVERTNEXT"],
// 1 16 0 0 -1.5 0 0 2 2 0 0 0 3 0 4-4cylo.dat
  [1,16,0,0,-1.5,0,0,2,2,0,0,0,3,0, ldraw_lib__4_4cylo()],
// 1 16 0 0 -1.5 0 0 2 2 0 0 0 1 0 4-4ndis.dat
  [1,16,0,0,-1.5,0,0,2,2,0,0,0,1,0, ldraw_lib__4_4ndis()],
// 1 16 0 0 1.5 0 0 2 2 0 0 0 -1 0 4-4ndis.dat
  [1,16,0,0,1.5,0,0,2,2,0,0,0,-1,0, ldraw_lib__4_4ndis()],
// 
// 1 16 -3.5 1.5 -1.5 0 0 -6 6 0 0 0 3 0 1-4cylo.dat
  [1,16,-3.5,1.5,-1.5,0,0,-6,6,0,0,0,3,0, ldraw_lib__1_4cylo()],
// 1 16 -3.5 1.5 -1.5 0 0 -6 6 0 0 0 1 0 1-4chrd.dat
  [1,16,-3.5,1.5,-1.5,0,0,-6,6,0,0,0,1,0, ldraw_lib__1_4chrd()],
// 1 16 -3.5 1.5 1.5 0 0 -6 6 0 0 0 -1 0 1-4chrd.dat
  [1,16,-3.5,1.5,1.5,0,0,-6,6,0,0,0,-1,0, ldraw_lib__1_4chrd()],
// 
// 3 16 -2 2 -1.5 -3.5 7.5 -1.5 0 2 -1.5
  [3,16,-2,2,-1.5,-3.5,7.5,-1.5,0,2,-1.5],
// 4 16 2 2 -1.5 0 2 -1.5 -3.5 7.5 -1.5 14.5 7.5 -1.5
  [4,16,2,2,-1.5,0,2,-1.5,-3.5,7.5,-1.5,14.5,7.5,-1.5],
// 4 16 2 2 -1.5 14.5 7.5 -1.5 14.5 -6.5 -1.5 2 0 -1.5
  [4,16,2,2,-1.5,14.5,7.5,-1.5,14.5,-6.5,-1.5,2,0,-1.5],
// 3 16 2 0 -1.5 14.5 -6.5 -1.5 2 -2 -1.5
  [3,16,2,0,-1.5,14.5,-6.5,-1.5,2,-2,-1.5],
// 4 16 0 -2 -1.5 2 -2 -1.5 14.5 -6.5 -1.5 -9.5 -6.5 -1.5
  [4,16,0,-2,-1.5,2,-2,-1.5,14.5,-6.5,-1.5,-9.5,-6.5,-1.5],
// 3 16 0 -2 -1.5 -9.5 -6.5 -1.5 -2 -2 -1.5
  [3,16,0,-2,-1.5,-9.5,-6.5,-1.5,-2,-2,-1.5],
// 4 16 -2 0 -1.5 -2 -2 -1.5 -9.5 -6.5 -1.5 -9.5 1.5 -1.5
  [4,16,-2,0,-1.5,-2,-2,-1.5,-9.5,-6.5,-1.5,-9.5,1.5,-1.5],
// 4 16 -3.5 7.5 -1.5 -2 2 -1.5 -2 0 -1.5 -9.5 1.5 -1.5
  [4,16,-3.5,7.5,-1.5,-2,2,-1.5,-2,0,-1.5,-9.5,1.5,-1.5],
// 1 16 -9.5 -2.5 0 0 1 0 0 0 -4 -1.5 0 0 rect3.dat
  [1,16,-9.5,-2.5,0,0,1,0,0,0,-4,-1.5,0,0, ldraw_lib__rect3()],
// 1 16 5.5 7.5 0 0 0 9 0 -1 0 1.5 0 0 rect3.dat
  [1,16,5.5,7.5,0,0,0,9,0,-1,0,1.5,0,0, ldraw_lib__rect3()],
// 
// 1 16 -57.5 -8.5 -9.5 0 0 -2 2 0 0 0 15.5 0 1-4cylo.dat
  [1,16,-57.5,-8.5,-9.5,0,0,-2,2,0,0,0,15.5,0, ldraw_lib__1_4cylo()],
// 1 16 -57.5 -8.5 -9.5 0 0 -2 2 0 0 0 1 0 1-4chrd.dat
  [1,16,-57.5,-8.5,-9.5,0,0,-2,2,0,0,0,1,0, ldraw_lib__1_4chrd()],
// 1 16 -57.5 -8.5 6 0 0 -2 2 0 0 0 -1 0 1-4chrd.dat
  [1,16,-57.5,-8.5,6,0,0,-2,2,0,0,0,-1,0, ldraw_lib__1_4chrd()],
// 
// 4 16 -11.5 -6.5 6 -11.5 -6.5 1.5 -57.5 -6.5 -9.5 -57.5 -6.5 6
  [4,16,-11.5,-6.5,6,-11.5,-6.5,1.5,-57.5,-6.5,-9.5,-57.5,-6.5,6],
// 4 16 -57.5 -6.5 -9.5 -11.5 -6.5 1.5 -9.5 -6.5 1.5 -9.5 -6.5 -1.5
  [4,16,-57.5,-6.5,-9.5,-11.5,-6.5,1.5,-9.5,-6.5,1.5,-9.5,-6.5,-1.5],
// 4 16 -57.5 -6.5 -9.5 -9.5 -6.5 -1.5 14.5 -6.5 -1.5 14.5 -6.5 -9.5
  [4,16,-57.5,-6.5,-9.5,-9.5,-6.5,-1.5,14.5,-6.5,-1.5,14.5,-6.5,-9.5],
// 1 16 -59.5 -15 -1.75 0 1 0 -6.5 0 0 0 0 7.75 rect2p.dat
  [1,16,-59.5,-15,-1.75,0,1,0,-6.5,0,0,0,0,7.75, ldraw_lib__rect2p()],
// 4 16 -59.5 -21.5 -9.5 -59.5 -8.5 -9.5 -57.5 -6.5 -9.5 -29.5 -21.5 -9.5
  [4,16,-59.5,-21.5,-9.5,-59.5,-8.5,-9.5,-57.5,-6.5,-9.5,-29.5,-21.5,-9.5],
// 4 16 14.5 -21.5 -9.5 -29.5 -21.5 -9.5 -57.5 -6.5 -9.5 14.5 -6.5 -9.5
  [4,16,14.5,-21.5,-9.5,-29.5,-21.5,-9.5,-57.5,-6.5,-9.5,14.5,-6.5,-9.5],
// 4 16 -59.5 -8.5 6 -59.5 -21.5 6 -29.5 -21.5 6 -57.5 -6.5 6
  [4,16,-59.5,-8.5,6,-59.5,-21.5,6,-29.5,-21.5,6,-57.5,-6.5,6],
// 4 16 -29.5 -21.5 6 -9.5 -8.5 6 -11.5 -6.5 6 -57.5 -6.5 6
  [4,16,-29.5,-21.5,6,-9.5,-8.5,6,-11.5,-6.5,6,-57.5,-6.5,6],
// 4 16 -9.5 -19.5 6 -9.5 -8.5 6 -29.5 -21.5 6 -11.5 -21.5 6
  [4,16,-9.5,-19.5,6,-9.5,-8.5,6,-29.5,-21.5,6,-11.5,-21.5,6],
// 4 16 -11.5 -21.5 1.5 -11.5 -21.5 6 -29.5 -21.5 6 -29.5 -21.5 -9.5
  [4,16,-11.5,-21.5,1.5,-11.5,-21.5,6,-29.5,-21.5,6,-29.5,-21.5,-9.5],
// 4 16 -9.5 -21.5 1.5 -11.5 -21.5 1.5 -29.5 -21.5 -9.5 14.5 -21.5 -9.5
  [4,16,-9.5,-21.5,1.5,-11.5,-21.5,1.5,-29.5,-21.5,-9.5,14.5,-21.5,-9.5],
// 3 16 14.5 -21.5 1.5 -9.5 -21.5 1.5 14.5 -21.5 -9.5
  [3,16,14.5,-21.5,1.5,-9.5,-21.5,1.5,14.5,-21.5,-9.5],
// 
// 1 16 -11.5 -8.5 1.5 0 0 2 2 0 0 0 4.5 0 1-4cylo.dat
  [1,16,-11.5,-8.5,1.5,0,0,2,2,0,0,0,4.5,0, ldraw_lib__1_4cylo()],
// 1 16 -11.5 -8.5 1.5 0 0 2 2 0 0 0 -1 0 1-4ndis.dat
  [1,16,-11.5,-8.5,1.5,0,0,2,2,0,0,0,-1,0, ldraw_lib__1_4ndis()],
// 1 16 -11.5 -8.5 6 0 0 2 2 0 0 0 -1 0 1-4chrd.dat
  [1,16,-11.5,-8.5,6,0,0,2,2,0,0,0,-1,0, ldraw_lib__1_4chrd()],
// 1 16 -9.5 -14 3.75 0 -1 0 5.5 0 0 0 0 2.25 rect2p.dat
  [1,16,-9.5,-14,3.75,0,-1,0,5.5,0,0,0,0,2.25, ldraw_lib__rect2p()],
// 1 16 -11.5 -19.5 1.5 0 0 2 -2 0 0 0 4.5 0 1-4cylo.dat
  [1,16,-11.5,-19.5,1.5,0,0,2,-2,0,0,0,4.5,0, ldraw_lib__1_4cylo()],
// 1 16 -11.5 -19.5 1.5 0 0 2 -2 0 0 0 -1 0 1-4ndis.dat
  [1,16,-11.5,-19.5,1.5,0,0,2,-2,0,0,0,-1,0, ldraw_lib__1_4ndis()],
// 1 16 -11.5 -19.5 6 0 0 2 -2 0 0 0 -1 0 1-4chrd.dat
  [1,16,-11.5,-19.5,6,0,0,2,-2,0,0,0,-1,0, ldraw_lib__1_4chrd()],
// 
// 3 16 -3.5 7.5 1.5 -2 2 1.5 0 2 1.5
  [3,16,-3.5,7.5,1.5,-2,2,1.5,0,2,1.5],
// 4 16 -3.5 7.5 1.5 0 2 1.5 2 2 1.5 14.5 7.5 1.5
  [4,16,-3.5,7.5,1.5,0,2,1.5,2,2,1.5,14.5,7.5,1.5],
// 3 16 2 0 1.5 14.5 7.5 1.5 2 2 1.5
  [3,16,2,0,1.5,14.5,7.5,1.5,2,2,1.5],
// 4 16 2 0 1.5 2 -2 1.5 14.5 -21.5 1.5 14.5 7.5 1.5
  [4,16,2,0,1.5,2,-2,1.5,14.5,-21.5,1.5,14.5,7.5,1.5],
// 3 16 0 -2 1.5 14.5 -21.5 1.5 2 -2 1.5
  [3,16,0,-2,1.5,14.5,-21.5,1.5,2,-2,1.5],
// 4 16 0 -2 1.5 -9.5 -6.5 1.5 -9.5 -8.5 1.5 14.5 -21.5 1.5
  [4,16,0,-2,1.5,-9.5,-6.5,1.5,-9.5,-8.5,1.5,14.5,-21.5,1.5],
// 3 16 -9.5 -6.5 1.5 0 -2 1.5 -2 -2 1.5
  [3,16,-9.5,-6.5,1.5,0,-2,1.5,-2,-2,1.5],
// 4 16 -9.5 -6.5 1.5 -2 -2 1.5 -2 0 1.5 -9.5 1.5 1.5
  [4,16,-9.5,-6.5,1.5,-2,-2,1.5,-2,0,1.5,-9.5,1.5,1.5],
// 4 16 -2 0 1.5 -2 2 1.5 -3.5 7.5 1.5 -9.5 1.5 1.5
  [4,16,-2,0,1.5,-2,2,1.5,-3.5,7.5,1.5,-9.5,1.5,1.5],
// 3 16 -9.5 -19.5 1.5 14.5 -21.5 1.5 -9.5 -8.5 1.5
  [3,16,-9.5,-19.5,1.5,14.5,-21.5,1.5,-9.5,-8.5,1.5],
// 3 16 -9.5 -21.5 1.5 14.5 -21.5 1.5 -9.5 -19.5 1.5
  [3,16,-9.5,-21.5,1.5,14.5,-21.5,1.5,-9.5,-19.5,1.5],
// 
// 1 16 14.5 -13.5 -4 0 2 0 0 0 5 2.5 0 0 box5.dat
  [1,16,14.5,-13.5,-4,0,2,0,0,0,5,2.5,0,0, ldraw_lib__box5()],
// 4 16 14.5 -6.5 -9.5 14.5 -6.5 -1.5 14.5 -8.5 -1.5 14.5 -8.5 -6.5
  [4,16,14.5,-6.5,-9.5,14.5,-6.5,-1.5,14.5,-8.5,-1.5,14.5,-8.5,-6.5],
// 4 16 14.5 -8.5 -6.5 14.5 -18.5 -6.5 14.5 -21.5 -9.5 14.5 -6.5 -9.5
  [4,16,14.5,-8.5,-6.5,14.5,-18.5,-6.5,14.5,-21.5,-9.5,14.5,-6.5,-9.5],
// 4 16 14.5 -21.5 -9.5 14.5 -18.5 -6.5 14.5 -18.5 -1.5 14.5 -21.5 1.5
  [4,16,14.5,-21.5,-9.5,14.5,-18.5,-6.5,14.5,-18.5,-1.5,14.5,-21.5,1.5],
// 3 16 14.5 -21.5 1.5 14.5 -18.5 -1.5 14.5 -8.5 -1.5
  [3,16,14.5,-21.5,1.5,14.5,-18.5,-1.5,14.5,-8.5,-1.5],
// 4 16 14.5 7.5 1.5 14.5 -21.5 1.5 14.5 -8.5 -1.5 14.5 -6.5 -1.5
  [4,16,14.5,7.5,1.5,14.5,-21.5,1.5,14.5,-8.5,-1.5,14.5,-6.5,-1.5],
// 3 16 14.5 7.5 1.5 14.5 -6.5 -1.5 14.5 7.5 -1.5
  [3,16,14.5,7.5,1.5,14.5,-6.5,-1.5,14.5,7.5,-1.5],
// 
// 1 16 -55.5 -21.5 -9.5 0 0 -4 -10 0 0 0 15.5 0 1-4cylo.dat
  [1,16,-55.5,-21.5,-9.5,0,0,-4,-10,0,0,0,15.5,0, ldraw_lib__1_4cylo()],
// 1 16 -55.5 -21.5 -9.5 0 0 -4 -10 0 0 0 1 0 1-4chrd.dat
  [1,16,-55.5,-21.5,-9.5,0,0,-4,-10,0,0,0,1,0, ldraw_lib__1_4chrd()],
// 1 16 -55.5 -21.5 6 0 0 -4 -10 0 0 0 -1 0 1-4chrd.dat
  [1,16,-55.5,-21.5,6,0,0,-4,-10,0,0,0,-1,0, ldraw_lib__1_4chrd()],
// 1 16 -33.5 -21.5 -9.5 0 0 4 -10 0 0 0 15.5 0 1-4cylo.dat
  [1,16,-33.5,-21.5,-9.5,0,0,4,-10,0,0,0,15.5,0, ldraw_lib__1_4cylo()],
// 1 16 -33.5 -21.5 -9.5 0 0 4 -10 0 0 0 1 0 1-4chrd.dat
  [1,16,-33.5,-21.5,-9.5,0,0,4,-10,0,0,0,1,0, ldraw_lib__1_4chrd()],
// 1 16 -33.5 -21.5 6 0 0 4 -10 0 0 0 -1 0 1-4chrd.dat
  [1,16,-33.5,-21.5,6,0,0,4,-10,0,0,0,-1,0, ldraw_lib__1_4chrd()],
// 4 16 -29.5 -21.5 -9.5 -33.5 -31.5 -9.5 -55.5 -31.5 -9.5 -59.5 -21.5 -9.5
  [4,16,-29.5,-21.5,-9.5,-33.5,-31.5,-9.5,-55.5,-31.5,-9.5,-59.5,-21.5,-9.5],
// 1 16 -44.5 -31.5 -1.75 -11 0 0 0 1 0 0 0 -7.75 rect2p.dat
  [1,16,-44.5,-31.5,-1.75,-11,0,0,0,1,0,0,0,-7.75, ldraw_lib__rect2p()],
// 4 16 -29.5 -21.5 6 -59.5 -21.5 6 -55.5 -31.5 6 -33.5 -31.5 6
  [4,16,-29.5,-21.5,6,-59.5,-21.5,6,-55.5,-31.5,6,-33.5,-31.5,6],
// 
// 2 24 -11.5 -6.5 6 -57.5 -6.5 6
  [2,24,-11.5,-6.5,6,-57.5,-6.5,6],
// 2 24 -9.5 -6.5 1.5 -11.5 -6.5 1.5
  [2,24,-9.5,-6.5,1.5,-11.5,-6.5,1.5],
// 2 24 -9.5 -6.5 -1.5 14.5 -6.5 -1.5
  [2,24,-9.5,-6.5,-1.5,14.5,-6.5,-1.5],
// 2 24 14.5 -6.5 -9.5 -57.5 -6.5 -9.5
  [2,24,14.5,-6.5,-9.5,-57.5,-6.5,-9.5],
// 2 24 14.5 7.5 -1.5 14.5 -6.5 -1.5
  [2,24,14.5,7.5,-1.5,14.5,-6.5,-1.5],
// 2 24 14.5 -6.5 -1.5 14.5 -6.5 -9.5
  [2,24,14.5,-6.5,-1.5,14.5,-6.5,-9.5],
// 2 24 14.5 -6.5 -9.5 14.5 -21.5 -9.5
  [2,24,14.5,-6.5,-9.5,14.5,-21.5,-9.5],
// 2 24 14.5 -21.5 -9.5 14.5 -21.5 1.5
  [2,24,14.5,-21.5,-9.5,14.5,-21.5,1.5],
// 2 24 14.5 -21.5 1.5 14.5 7.5 1.5
  [2,24,14.5,-21.5,1.5,14.5,7.5,1.5],
// 2 24 -29.5 -21.5 -9.5 -29.5 -21.5 6
  [2,24,-29.5,-21.5,-9.5,-29.5,-21.5,6],
// 2 24 -29.5 -21.5 6 -11.5 -21.5 6
  [2,24,-29.5,-21.5,6,-11.5,-21.5,6],
// 2 24 -11.5 -21.5 1.5 14.5 -21.5 1.5
  [2,24,-11.5,-21.5,1.5,14.5,-21.5,1.5],
// 2 24 -29.5 -21.5 -9.5 14.5 -21.5 -9.5
  [2,24,-29.5,-21.5,-9.5,14.5,-21.5,-9.5],
];
module ldraw_lib__u9187f(step=0, col=false, unit=2/5, alt=false, line=0.2, solid=!$preview)
    makepoly(ldraw_lib__u9187f(), step=step, col=col, unit=unit, alt=alt, line=line, solid=solid);
ldraw_lib__u9187f(line=0.2);
